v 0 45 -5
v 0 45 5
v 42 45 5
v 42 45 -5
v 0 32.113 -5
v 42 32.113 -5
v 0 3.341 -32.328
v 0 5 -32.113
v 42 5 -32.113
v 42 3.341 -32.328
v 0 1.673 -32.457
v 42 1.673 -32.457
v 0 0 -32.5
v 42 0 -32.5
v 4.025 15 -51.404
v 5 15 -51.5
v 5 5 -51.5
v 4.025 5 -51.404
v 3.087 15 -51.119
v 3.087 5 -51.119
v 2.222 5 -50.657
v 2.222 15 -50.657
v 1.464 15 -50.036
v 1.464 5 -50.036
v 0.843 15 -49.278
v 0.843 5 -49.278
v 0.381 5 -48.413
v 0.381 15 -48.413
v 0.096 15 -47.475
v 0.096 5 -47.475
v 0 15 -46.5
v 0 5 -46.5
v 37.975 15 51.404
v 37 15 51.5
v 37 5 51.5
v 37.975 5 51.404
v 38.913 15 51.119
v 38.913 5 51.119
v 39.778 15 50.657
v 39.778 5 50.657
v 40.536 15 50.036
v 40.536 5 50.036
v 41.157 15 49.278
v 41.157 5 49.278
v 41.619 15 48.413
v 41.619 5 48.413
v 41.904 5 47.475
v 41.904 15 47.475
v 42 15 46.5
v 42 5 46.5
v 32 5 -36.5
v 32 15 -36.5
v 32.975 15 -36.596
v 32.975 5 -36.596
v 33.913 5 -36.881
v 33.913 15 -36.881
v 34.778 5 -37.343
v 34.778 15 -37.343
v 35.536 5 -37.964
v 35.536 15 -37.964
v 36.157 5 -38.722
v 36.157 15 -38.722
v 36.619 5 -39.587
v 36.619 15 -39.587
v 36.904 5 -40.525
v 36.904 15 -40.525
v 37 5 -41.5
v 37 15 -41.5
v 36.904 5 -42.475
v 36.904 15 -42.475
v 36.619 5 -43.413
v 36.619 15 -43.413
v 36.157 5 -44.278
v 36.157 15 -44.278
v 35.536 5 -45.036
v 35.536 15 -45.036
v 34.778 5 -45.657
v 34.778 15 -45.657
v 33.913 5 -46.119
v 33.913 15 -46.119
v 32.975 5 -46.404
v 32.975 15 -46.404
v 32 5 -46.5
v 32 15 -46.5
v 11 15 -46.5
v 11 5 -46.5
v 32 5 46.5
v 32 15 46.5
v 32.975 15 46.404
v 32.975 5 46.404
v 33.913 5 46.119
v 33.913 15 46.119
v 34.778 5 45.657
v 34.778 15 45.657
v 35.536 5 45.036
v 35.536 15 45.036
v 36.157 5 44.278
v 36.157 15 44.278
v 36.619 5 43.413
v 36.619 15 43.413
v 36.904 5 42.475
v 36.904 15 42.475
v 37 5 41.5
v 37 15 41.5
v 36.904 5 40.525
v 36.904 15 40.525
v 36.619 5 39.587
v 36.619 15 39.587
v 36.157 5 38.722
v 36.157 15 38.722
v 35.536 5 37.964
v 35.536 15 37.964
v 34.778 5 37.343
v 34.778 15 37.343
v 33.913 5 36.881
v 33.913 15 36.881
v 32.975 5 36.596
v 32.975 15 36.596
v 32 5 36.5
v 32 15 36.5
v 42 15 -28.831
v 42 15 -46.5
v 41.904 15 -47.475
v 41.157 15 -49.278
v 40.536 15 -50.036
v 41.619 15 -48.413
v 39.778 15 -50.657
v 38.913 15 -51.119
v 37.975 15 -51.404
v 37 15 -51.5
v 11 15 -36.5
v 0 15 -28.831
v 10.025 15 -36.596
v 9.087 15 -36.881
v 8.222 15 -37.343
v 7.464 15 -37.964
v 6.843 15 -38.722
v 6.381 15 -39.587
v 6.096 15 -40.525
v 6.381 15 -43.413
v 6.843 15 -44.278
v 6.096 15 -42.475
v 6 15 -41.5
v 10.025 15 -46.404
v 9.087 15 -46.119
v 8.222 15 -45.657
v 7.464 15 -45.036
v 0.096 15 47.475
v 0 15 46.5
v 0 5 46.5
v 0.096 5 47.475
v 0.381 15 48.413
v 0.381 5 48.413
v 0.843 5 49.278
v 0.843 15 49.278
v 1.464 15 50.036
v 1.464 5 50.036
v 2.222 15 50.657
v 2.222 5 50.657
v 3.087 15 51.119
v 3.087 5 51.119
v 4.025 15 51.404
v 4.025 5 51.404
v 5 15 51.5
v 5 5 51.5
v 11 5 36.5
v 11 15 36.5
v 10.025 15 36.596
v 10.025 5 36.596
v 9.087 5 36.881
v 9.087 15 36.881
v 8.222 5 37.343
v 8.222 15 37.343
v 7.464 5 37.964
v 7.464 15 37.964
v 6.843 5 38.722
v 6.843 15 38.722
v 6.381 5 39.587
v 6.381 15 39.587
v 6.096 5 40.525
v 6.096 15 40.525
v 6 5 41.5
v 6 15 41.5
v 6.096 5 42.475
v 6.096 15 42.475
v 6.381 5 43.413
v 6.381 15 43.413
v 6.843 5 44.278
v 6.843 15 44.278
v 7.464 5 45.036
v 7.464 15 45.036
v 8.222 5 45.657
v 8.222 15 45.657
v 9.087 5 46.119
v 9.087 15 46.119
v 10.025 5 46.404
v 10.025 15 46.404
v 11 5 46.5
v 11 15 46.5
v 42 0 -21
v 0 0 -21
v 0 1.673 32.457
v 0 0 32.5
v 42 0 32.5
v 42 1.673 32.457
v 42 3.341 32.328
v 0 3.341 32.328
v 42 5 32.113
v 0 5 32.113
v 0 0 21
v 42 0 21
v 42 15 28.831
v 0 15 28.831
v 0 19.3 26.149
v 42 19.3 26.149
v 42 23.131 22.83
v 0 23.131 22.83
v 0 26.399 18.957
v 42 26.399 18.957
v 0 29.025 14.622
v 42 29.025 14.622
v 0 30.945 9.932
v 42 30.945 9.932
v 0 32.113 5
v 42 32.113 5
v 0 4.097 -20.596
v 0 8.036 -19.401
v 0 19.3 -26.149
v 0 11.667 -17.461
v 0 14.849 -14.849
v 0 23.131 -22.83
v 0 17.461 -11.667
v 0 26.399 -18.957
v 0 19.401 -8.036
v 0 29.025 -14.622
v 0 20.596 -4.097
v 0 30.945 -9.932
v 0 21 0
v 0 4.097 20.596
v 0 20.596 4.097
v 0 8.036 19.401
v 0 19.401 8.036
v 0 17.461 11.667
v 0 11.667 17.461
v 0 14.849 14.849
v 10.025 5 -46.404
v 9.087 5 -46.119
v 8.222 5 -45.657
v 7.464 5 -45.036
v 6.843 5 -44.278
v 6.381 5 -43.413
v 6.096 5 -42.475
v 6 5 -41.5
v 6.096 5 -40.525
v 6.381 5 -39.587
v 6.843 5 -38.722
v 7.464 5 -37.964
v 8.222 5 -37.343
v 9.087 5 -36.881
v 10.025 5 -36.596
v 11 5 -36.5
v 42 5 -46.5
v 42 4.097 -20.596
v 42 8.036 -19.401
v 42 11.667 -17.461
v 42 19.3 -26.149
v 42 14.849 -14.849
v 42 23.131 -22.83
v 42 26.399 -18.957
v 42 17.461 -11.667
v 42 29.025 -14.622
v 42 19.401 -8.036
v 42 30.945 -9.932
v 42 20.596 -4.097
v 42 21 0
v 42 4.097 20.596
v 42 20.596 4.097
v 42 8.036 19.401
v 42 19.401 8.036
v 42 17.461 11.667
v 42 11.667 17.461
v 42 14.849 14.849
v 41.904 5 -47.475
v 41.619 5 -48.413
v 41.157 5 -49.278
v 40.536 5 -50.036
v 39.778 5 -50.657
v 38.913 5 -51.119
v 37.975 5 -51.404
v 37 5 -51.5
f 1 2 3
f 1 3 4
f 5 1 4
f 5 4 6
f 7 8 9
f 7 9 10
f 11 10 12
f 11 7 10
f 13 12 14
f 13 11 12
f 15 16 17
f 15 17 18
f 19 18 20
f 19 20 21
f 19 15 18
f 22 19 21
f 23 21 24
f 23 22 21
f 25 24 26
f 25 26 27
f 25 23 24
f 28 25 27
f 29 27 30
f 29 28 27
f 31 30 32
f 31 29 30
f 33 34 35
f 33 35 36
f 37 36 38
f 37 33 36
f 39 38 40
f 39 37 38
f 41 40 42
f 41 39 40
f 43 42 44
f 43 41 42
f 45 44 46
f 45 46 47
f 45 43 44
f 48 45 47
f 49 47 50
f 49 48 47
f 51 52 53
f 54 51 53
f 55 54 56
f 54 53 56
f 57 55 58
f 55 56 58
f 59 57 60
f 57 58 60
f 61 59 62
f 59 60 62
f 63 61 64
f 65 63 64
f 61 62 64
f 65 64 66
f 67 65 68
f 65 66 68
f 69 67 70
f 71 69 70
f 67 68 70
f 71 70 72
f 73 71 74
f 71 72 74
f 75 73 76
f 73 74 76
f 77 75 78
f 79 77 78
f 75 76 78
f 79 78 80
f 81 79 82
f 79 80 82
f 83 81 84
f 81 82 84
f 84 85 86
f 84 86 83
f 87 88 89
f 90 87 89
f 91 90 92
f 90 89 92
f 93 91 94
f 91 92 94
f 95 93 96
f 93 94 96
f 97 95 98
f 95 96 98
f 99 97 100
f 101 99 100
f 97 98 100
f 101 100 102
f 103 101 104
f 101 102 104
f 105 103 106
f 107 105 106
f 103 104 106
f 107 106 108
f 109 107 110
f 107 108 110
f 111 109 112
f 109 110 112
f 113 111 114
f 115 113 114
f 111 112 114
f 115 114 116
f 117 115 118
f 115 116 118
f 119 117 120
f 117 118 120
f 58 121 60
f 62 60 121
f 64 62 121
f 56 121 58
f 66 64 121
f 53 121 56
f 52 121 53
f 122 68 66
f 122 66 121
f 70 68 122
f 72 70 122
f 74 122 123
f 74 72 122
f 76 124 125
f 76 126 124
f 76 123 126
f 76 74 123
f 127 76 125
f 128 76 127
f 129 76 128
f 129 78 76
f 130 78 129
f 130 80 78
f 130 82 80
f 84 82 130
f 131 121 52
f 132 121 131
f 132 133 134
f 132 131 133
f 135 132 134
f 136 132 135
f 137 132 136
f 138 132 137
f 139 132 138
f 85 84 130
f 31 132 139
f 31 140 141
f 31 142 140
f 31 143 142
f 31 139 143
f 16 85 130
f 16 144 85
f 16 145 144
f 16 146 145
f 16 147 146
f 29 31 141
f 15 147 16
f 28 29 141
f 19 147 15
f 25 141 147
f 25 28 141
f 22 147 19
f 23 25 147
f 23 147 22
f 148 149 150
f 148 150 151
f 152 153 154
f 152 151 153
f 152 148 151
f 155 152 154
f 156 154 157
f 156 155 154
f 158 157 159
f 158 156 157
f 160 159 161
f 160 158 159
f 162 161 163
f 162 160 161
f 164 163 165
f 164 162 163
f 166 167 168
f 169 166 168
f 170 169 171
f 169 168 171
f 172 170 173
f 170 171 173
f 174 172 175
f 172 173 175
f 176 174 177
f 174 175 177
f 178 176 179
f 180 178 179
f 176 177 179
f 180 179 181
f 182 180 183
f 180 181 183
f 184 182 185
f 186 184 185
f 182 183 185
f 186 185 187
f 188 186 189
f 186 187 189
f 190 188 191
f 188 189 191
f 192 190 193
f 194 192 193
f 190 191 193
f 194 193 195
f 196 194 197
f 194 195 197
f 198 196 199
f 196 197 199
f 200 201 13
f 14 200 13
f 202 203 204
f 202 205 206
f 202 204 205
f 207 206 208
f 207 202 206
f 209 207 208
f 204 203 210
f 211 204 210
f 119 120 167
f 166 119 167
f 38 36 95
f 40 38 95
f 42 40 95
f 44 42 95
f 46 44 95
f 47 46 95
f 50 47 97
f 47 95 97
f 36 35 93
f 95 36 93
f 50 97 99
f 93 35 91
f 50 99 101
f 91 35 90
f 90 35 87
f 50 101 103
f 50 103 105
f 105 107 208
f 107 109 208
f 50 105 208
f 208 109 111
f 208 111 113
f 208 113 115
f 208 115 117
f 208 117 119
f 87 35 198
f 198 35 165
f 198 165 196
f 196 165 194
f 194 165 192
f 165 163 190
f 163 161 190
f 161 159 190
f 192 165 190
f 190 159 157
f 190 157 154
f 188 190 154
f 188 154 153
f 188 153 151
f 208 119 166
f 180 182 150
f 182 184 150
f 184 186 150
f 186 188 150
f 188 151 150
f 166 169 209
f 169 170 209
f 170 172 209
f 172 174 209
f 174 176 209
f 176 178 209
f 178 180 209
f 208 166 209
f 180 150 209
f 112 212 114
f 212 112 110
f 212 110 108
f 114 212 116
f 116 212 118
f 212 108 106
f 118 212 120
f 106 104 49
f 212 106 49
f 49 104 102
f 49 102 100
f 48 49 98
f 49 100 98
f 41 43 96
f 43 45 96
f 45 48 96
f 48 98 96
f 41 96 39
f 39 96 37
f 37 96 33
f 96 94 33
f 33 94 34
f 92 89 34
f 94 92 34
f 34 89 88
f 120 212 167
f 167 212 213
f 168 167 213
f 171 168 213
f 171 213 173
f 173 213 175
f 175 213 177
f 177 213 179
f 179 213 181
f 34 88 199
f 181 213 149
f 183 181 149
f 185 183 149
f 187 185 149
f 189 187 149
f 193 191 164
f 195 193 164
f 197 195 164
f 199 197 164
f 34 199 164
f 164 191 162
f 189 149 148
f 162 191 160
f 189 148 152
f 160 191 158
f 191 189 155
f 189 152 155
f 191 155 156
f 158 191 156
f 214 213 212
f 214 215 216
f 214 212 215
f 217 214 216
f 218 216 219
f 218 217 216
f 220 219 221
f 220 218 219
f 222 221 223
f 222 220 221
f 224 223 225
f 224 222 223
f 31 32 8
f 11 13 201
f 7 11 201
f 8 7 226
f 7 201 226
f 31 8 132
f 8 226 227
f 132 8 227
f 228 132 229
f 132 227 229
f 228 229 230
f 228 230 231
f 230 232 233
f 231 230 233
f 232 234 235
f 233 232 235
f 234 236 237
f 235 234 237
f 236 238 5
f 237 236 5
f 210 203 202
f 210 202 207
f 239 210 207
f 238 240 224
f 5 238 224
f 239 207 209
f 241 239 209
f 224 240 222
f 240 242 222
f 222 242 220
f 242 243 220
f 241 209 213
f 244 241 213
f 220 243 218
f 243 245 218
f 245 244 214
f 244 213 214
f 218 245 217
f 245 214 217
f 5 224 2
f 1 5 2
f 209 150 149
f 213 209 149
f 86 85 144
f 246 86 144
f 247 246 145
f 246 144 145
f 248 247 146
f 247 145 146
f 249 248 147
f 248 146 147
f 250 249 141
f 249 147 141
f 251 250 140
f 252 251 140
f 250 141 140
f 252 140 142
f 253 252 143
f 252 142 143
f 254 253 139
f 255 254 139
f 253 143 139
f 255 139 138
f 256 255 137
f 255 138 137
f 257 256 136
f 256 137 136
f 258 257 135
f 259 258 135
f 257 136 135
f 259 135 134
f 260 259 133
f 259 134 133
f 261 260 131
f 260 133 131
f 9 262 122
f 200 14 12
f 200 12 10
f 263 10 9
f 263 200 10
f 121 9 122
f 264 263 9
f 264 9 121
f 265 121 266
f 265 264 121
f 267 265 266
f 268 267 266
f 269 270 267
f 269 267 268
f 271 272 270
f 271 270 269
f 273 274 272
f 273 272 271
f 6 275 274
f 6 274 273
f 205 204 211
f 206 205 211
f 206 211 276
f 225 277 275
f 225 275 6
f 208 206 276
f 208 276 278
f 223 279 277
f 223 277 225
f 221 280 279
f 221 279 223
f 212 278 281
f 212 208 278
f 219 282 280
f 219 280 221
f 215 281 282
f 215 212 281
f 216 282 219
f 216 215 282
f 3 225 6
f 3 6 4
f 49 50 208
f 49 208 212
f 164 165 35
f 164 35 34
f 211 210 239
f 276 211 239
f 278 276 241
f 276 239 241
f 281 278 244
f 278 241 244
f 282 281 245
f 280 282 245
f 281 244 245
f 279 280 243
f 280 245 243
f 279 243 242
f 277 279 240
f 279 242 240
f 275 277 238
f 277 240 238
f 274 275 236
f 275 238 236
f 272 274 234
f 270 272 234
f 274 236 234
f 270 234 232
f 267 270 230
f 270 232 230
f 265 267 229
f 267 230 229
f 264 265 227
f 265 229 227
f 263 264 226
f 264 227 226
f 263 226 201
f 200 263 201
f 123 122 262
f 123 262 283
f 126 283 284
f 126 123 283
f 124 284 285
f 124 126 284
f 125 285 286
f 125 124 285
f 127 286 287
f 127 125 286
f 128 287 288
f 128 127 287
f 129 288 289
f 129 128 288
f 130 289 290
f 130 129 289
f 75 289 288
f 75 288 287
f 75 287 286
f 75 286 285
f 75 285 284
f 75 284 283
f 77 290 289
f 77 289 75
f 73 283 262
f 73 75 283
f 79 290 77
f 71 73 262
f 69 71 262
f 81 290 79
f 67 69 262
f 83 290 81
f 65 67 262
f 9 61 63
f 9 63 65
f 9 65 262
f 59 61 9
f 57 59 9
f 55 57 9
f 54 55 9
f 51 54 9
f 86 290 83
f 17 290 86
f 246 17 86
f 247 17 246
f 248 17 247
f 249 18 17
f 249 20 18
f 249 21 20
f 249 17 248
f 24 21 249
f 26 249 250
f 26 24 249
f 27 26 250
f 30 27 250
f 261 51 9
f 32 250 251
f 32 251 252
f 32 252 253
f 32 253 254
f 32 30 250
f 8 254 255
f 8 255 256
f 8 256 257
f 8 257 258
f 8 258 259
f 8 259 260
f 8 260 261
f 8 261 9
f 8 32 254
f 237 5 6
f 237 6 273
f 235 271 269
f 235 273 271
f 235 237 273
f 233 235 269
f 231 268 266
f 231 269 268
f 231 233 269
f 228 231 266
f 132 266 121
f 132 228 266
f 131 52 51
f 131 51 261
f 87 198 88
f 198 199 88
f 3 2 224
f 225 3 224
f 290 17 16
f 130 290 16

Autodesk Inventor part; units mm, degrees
ref_plane "YZ Plane" through (0, 0, 0) normal (1, 0, 0) x (0, 1, 0)
ref_plane "XZ Plane" through (0, 0, 0) normal (0, 1, 0) x (-1, 0, 0)
ref_plane "XY Plane" through (0, 0, 0) normal (0, 0, 1) x (1, 0, 0)
sketch "草圖1" plane through (0, 0, 0) normal (1, 0, 0) x (0, 1, 0)
  arc A0 (0, -21) -> (0, 21) centre (0, 0) ccw
  line L0 (0, 33.7624) -> (0, -28.793) construction
  line L1 (0, -21) -> (0, -32.5)
  line L2 (15, -28.8314) -> (15, -51.5)
  line L3 (5, -51.5) -> (5, -32.1131)
  arc A1 (0, -32.5) -> (5, -32.1131) centre (0, 0) ccw
  line L4 (5, -51.5) -> (15, -51.5)
  line L5 (0, 0) -> (31.6672, 0)
  line L6 (45, -5) -> (32.1131, -5)
  line L7 (45, -5) -> (45, 0)
  arc A2 (15, -28.8314) -> (32.1131, -5) centre (0, 0) ccw
  line L8 (45, 5) -> (32.1131, 5)
  line L9 (45, 5) -> (45, 0)
  line L10 (15, 28.8314) -> (15, 51.5)
  line L11 (5, 51.5) -> (5, 32.1131)
  line L12 (5, 51.5) -> (15, 51.5)
  arc A3 (32.1131, 5) -> (15, 28.8314) centre (0, 0) ccw
  arc A4 (5, 32.1131) -> (0, 32.5) centre (0, 0) ccw
  line L13 (0, 32.5) -> (0, 21)
  dimension "d0" = 10
  dimension "d2" = 45
  dimension "d4" = 10
  dimension "d6" = 42
  dimension "d7" = 65
  dimension "d9" = 103
  dimension "d10" = 5
extrude "擠出1" add sketch "草圖1" along normal blind 42
fillet "圓角1" radius 5 4 edges at (42, 10, 51.5) (0, 10, 51.5) (42, 10, -51.5) (0, 10, -51.5)
sketch "草圖2" plane through (0, 15, 28.8314) normal (0, 1, 0) x (1, 0, 0)
  arc A0 (11, -7.6686) -> (11, -17.6686) centre (11, -12.6686) ccw
  arc A1 (32, -17.6686) -> (32, -7.6686) centre (32, -12.6686) ccw
  line L0 (32, -7.6686) -> (11, -7.6686)
  line L1 (11, -17.6686) -> (32, -17.6686)
  line L2 (42, 0) -> (42, -17.6686) projected
  line L3 (0, 28.8314) -> (45.6948, 28.8314)
  arc A2 (11, 75.3314) -> (11, 65.3314) centre (11, 70.3314) ccw
  arc A3 (32, 65.3314) -> (32, 75.3314) centre (32, 70.3314) ccw
  line L4 (32, 65.3314) -> (11, 65.3314)
  line L5 (11, 75.3314) -> (32, 75.3314)
  line L6 (5, -22.6686) -> (37, -22.6686) projected
  point P0 (42, 75.3314)
  dimension "d14" = 10
  dimension "d15" = 21
  dimension "d16" = 10
  dimension "d17" = 83
extrude "擠出2" cut sketch "草圖2" against normal blind 42
properties part number "練習一"
